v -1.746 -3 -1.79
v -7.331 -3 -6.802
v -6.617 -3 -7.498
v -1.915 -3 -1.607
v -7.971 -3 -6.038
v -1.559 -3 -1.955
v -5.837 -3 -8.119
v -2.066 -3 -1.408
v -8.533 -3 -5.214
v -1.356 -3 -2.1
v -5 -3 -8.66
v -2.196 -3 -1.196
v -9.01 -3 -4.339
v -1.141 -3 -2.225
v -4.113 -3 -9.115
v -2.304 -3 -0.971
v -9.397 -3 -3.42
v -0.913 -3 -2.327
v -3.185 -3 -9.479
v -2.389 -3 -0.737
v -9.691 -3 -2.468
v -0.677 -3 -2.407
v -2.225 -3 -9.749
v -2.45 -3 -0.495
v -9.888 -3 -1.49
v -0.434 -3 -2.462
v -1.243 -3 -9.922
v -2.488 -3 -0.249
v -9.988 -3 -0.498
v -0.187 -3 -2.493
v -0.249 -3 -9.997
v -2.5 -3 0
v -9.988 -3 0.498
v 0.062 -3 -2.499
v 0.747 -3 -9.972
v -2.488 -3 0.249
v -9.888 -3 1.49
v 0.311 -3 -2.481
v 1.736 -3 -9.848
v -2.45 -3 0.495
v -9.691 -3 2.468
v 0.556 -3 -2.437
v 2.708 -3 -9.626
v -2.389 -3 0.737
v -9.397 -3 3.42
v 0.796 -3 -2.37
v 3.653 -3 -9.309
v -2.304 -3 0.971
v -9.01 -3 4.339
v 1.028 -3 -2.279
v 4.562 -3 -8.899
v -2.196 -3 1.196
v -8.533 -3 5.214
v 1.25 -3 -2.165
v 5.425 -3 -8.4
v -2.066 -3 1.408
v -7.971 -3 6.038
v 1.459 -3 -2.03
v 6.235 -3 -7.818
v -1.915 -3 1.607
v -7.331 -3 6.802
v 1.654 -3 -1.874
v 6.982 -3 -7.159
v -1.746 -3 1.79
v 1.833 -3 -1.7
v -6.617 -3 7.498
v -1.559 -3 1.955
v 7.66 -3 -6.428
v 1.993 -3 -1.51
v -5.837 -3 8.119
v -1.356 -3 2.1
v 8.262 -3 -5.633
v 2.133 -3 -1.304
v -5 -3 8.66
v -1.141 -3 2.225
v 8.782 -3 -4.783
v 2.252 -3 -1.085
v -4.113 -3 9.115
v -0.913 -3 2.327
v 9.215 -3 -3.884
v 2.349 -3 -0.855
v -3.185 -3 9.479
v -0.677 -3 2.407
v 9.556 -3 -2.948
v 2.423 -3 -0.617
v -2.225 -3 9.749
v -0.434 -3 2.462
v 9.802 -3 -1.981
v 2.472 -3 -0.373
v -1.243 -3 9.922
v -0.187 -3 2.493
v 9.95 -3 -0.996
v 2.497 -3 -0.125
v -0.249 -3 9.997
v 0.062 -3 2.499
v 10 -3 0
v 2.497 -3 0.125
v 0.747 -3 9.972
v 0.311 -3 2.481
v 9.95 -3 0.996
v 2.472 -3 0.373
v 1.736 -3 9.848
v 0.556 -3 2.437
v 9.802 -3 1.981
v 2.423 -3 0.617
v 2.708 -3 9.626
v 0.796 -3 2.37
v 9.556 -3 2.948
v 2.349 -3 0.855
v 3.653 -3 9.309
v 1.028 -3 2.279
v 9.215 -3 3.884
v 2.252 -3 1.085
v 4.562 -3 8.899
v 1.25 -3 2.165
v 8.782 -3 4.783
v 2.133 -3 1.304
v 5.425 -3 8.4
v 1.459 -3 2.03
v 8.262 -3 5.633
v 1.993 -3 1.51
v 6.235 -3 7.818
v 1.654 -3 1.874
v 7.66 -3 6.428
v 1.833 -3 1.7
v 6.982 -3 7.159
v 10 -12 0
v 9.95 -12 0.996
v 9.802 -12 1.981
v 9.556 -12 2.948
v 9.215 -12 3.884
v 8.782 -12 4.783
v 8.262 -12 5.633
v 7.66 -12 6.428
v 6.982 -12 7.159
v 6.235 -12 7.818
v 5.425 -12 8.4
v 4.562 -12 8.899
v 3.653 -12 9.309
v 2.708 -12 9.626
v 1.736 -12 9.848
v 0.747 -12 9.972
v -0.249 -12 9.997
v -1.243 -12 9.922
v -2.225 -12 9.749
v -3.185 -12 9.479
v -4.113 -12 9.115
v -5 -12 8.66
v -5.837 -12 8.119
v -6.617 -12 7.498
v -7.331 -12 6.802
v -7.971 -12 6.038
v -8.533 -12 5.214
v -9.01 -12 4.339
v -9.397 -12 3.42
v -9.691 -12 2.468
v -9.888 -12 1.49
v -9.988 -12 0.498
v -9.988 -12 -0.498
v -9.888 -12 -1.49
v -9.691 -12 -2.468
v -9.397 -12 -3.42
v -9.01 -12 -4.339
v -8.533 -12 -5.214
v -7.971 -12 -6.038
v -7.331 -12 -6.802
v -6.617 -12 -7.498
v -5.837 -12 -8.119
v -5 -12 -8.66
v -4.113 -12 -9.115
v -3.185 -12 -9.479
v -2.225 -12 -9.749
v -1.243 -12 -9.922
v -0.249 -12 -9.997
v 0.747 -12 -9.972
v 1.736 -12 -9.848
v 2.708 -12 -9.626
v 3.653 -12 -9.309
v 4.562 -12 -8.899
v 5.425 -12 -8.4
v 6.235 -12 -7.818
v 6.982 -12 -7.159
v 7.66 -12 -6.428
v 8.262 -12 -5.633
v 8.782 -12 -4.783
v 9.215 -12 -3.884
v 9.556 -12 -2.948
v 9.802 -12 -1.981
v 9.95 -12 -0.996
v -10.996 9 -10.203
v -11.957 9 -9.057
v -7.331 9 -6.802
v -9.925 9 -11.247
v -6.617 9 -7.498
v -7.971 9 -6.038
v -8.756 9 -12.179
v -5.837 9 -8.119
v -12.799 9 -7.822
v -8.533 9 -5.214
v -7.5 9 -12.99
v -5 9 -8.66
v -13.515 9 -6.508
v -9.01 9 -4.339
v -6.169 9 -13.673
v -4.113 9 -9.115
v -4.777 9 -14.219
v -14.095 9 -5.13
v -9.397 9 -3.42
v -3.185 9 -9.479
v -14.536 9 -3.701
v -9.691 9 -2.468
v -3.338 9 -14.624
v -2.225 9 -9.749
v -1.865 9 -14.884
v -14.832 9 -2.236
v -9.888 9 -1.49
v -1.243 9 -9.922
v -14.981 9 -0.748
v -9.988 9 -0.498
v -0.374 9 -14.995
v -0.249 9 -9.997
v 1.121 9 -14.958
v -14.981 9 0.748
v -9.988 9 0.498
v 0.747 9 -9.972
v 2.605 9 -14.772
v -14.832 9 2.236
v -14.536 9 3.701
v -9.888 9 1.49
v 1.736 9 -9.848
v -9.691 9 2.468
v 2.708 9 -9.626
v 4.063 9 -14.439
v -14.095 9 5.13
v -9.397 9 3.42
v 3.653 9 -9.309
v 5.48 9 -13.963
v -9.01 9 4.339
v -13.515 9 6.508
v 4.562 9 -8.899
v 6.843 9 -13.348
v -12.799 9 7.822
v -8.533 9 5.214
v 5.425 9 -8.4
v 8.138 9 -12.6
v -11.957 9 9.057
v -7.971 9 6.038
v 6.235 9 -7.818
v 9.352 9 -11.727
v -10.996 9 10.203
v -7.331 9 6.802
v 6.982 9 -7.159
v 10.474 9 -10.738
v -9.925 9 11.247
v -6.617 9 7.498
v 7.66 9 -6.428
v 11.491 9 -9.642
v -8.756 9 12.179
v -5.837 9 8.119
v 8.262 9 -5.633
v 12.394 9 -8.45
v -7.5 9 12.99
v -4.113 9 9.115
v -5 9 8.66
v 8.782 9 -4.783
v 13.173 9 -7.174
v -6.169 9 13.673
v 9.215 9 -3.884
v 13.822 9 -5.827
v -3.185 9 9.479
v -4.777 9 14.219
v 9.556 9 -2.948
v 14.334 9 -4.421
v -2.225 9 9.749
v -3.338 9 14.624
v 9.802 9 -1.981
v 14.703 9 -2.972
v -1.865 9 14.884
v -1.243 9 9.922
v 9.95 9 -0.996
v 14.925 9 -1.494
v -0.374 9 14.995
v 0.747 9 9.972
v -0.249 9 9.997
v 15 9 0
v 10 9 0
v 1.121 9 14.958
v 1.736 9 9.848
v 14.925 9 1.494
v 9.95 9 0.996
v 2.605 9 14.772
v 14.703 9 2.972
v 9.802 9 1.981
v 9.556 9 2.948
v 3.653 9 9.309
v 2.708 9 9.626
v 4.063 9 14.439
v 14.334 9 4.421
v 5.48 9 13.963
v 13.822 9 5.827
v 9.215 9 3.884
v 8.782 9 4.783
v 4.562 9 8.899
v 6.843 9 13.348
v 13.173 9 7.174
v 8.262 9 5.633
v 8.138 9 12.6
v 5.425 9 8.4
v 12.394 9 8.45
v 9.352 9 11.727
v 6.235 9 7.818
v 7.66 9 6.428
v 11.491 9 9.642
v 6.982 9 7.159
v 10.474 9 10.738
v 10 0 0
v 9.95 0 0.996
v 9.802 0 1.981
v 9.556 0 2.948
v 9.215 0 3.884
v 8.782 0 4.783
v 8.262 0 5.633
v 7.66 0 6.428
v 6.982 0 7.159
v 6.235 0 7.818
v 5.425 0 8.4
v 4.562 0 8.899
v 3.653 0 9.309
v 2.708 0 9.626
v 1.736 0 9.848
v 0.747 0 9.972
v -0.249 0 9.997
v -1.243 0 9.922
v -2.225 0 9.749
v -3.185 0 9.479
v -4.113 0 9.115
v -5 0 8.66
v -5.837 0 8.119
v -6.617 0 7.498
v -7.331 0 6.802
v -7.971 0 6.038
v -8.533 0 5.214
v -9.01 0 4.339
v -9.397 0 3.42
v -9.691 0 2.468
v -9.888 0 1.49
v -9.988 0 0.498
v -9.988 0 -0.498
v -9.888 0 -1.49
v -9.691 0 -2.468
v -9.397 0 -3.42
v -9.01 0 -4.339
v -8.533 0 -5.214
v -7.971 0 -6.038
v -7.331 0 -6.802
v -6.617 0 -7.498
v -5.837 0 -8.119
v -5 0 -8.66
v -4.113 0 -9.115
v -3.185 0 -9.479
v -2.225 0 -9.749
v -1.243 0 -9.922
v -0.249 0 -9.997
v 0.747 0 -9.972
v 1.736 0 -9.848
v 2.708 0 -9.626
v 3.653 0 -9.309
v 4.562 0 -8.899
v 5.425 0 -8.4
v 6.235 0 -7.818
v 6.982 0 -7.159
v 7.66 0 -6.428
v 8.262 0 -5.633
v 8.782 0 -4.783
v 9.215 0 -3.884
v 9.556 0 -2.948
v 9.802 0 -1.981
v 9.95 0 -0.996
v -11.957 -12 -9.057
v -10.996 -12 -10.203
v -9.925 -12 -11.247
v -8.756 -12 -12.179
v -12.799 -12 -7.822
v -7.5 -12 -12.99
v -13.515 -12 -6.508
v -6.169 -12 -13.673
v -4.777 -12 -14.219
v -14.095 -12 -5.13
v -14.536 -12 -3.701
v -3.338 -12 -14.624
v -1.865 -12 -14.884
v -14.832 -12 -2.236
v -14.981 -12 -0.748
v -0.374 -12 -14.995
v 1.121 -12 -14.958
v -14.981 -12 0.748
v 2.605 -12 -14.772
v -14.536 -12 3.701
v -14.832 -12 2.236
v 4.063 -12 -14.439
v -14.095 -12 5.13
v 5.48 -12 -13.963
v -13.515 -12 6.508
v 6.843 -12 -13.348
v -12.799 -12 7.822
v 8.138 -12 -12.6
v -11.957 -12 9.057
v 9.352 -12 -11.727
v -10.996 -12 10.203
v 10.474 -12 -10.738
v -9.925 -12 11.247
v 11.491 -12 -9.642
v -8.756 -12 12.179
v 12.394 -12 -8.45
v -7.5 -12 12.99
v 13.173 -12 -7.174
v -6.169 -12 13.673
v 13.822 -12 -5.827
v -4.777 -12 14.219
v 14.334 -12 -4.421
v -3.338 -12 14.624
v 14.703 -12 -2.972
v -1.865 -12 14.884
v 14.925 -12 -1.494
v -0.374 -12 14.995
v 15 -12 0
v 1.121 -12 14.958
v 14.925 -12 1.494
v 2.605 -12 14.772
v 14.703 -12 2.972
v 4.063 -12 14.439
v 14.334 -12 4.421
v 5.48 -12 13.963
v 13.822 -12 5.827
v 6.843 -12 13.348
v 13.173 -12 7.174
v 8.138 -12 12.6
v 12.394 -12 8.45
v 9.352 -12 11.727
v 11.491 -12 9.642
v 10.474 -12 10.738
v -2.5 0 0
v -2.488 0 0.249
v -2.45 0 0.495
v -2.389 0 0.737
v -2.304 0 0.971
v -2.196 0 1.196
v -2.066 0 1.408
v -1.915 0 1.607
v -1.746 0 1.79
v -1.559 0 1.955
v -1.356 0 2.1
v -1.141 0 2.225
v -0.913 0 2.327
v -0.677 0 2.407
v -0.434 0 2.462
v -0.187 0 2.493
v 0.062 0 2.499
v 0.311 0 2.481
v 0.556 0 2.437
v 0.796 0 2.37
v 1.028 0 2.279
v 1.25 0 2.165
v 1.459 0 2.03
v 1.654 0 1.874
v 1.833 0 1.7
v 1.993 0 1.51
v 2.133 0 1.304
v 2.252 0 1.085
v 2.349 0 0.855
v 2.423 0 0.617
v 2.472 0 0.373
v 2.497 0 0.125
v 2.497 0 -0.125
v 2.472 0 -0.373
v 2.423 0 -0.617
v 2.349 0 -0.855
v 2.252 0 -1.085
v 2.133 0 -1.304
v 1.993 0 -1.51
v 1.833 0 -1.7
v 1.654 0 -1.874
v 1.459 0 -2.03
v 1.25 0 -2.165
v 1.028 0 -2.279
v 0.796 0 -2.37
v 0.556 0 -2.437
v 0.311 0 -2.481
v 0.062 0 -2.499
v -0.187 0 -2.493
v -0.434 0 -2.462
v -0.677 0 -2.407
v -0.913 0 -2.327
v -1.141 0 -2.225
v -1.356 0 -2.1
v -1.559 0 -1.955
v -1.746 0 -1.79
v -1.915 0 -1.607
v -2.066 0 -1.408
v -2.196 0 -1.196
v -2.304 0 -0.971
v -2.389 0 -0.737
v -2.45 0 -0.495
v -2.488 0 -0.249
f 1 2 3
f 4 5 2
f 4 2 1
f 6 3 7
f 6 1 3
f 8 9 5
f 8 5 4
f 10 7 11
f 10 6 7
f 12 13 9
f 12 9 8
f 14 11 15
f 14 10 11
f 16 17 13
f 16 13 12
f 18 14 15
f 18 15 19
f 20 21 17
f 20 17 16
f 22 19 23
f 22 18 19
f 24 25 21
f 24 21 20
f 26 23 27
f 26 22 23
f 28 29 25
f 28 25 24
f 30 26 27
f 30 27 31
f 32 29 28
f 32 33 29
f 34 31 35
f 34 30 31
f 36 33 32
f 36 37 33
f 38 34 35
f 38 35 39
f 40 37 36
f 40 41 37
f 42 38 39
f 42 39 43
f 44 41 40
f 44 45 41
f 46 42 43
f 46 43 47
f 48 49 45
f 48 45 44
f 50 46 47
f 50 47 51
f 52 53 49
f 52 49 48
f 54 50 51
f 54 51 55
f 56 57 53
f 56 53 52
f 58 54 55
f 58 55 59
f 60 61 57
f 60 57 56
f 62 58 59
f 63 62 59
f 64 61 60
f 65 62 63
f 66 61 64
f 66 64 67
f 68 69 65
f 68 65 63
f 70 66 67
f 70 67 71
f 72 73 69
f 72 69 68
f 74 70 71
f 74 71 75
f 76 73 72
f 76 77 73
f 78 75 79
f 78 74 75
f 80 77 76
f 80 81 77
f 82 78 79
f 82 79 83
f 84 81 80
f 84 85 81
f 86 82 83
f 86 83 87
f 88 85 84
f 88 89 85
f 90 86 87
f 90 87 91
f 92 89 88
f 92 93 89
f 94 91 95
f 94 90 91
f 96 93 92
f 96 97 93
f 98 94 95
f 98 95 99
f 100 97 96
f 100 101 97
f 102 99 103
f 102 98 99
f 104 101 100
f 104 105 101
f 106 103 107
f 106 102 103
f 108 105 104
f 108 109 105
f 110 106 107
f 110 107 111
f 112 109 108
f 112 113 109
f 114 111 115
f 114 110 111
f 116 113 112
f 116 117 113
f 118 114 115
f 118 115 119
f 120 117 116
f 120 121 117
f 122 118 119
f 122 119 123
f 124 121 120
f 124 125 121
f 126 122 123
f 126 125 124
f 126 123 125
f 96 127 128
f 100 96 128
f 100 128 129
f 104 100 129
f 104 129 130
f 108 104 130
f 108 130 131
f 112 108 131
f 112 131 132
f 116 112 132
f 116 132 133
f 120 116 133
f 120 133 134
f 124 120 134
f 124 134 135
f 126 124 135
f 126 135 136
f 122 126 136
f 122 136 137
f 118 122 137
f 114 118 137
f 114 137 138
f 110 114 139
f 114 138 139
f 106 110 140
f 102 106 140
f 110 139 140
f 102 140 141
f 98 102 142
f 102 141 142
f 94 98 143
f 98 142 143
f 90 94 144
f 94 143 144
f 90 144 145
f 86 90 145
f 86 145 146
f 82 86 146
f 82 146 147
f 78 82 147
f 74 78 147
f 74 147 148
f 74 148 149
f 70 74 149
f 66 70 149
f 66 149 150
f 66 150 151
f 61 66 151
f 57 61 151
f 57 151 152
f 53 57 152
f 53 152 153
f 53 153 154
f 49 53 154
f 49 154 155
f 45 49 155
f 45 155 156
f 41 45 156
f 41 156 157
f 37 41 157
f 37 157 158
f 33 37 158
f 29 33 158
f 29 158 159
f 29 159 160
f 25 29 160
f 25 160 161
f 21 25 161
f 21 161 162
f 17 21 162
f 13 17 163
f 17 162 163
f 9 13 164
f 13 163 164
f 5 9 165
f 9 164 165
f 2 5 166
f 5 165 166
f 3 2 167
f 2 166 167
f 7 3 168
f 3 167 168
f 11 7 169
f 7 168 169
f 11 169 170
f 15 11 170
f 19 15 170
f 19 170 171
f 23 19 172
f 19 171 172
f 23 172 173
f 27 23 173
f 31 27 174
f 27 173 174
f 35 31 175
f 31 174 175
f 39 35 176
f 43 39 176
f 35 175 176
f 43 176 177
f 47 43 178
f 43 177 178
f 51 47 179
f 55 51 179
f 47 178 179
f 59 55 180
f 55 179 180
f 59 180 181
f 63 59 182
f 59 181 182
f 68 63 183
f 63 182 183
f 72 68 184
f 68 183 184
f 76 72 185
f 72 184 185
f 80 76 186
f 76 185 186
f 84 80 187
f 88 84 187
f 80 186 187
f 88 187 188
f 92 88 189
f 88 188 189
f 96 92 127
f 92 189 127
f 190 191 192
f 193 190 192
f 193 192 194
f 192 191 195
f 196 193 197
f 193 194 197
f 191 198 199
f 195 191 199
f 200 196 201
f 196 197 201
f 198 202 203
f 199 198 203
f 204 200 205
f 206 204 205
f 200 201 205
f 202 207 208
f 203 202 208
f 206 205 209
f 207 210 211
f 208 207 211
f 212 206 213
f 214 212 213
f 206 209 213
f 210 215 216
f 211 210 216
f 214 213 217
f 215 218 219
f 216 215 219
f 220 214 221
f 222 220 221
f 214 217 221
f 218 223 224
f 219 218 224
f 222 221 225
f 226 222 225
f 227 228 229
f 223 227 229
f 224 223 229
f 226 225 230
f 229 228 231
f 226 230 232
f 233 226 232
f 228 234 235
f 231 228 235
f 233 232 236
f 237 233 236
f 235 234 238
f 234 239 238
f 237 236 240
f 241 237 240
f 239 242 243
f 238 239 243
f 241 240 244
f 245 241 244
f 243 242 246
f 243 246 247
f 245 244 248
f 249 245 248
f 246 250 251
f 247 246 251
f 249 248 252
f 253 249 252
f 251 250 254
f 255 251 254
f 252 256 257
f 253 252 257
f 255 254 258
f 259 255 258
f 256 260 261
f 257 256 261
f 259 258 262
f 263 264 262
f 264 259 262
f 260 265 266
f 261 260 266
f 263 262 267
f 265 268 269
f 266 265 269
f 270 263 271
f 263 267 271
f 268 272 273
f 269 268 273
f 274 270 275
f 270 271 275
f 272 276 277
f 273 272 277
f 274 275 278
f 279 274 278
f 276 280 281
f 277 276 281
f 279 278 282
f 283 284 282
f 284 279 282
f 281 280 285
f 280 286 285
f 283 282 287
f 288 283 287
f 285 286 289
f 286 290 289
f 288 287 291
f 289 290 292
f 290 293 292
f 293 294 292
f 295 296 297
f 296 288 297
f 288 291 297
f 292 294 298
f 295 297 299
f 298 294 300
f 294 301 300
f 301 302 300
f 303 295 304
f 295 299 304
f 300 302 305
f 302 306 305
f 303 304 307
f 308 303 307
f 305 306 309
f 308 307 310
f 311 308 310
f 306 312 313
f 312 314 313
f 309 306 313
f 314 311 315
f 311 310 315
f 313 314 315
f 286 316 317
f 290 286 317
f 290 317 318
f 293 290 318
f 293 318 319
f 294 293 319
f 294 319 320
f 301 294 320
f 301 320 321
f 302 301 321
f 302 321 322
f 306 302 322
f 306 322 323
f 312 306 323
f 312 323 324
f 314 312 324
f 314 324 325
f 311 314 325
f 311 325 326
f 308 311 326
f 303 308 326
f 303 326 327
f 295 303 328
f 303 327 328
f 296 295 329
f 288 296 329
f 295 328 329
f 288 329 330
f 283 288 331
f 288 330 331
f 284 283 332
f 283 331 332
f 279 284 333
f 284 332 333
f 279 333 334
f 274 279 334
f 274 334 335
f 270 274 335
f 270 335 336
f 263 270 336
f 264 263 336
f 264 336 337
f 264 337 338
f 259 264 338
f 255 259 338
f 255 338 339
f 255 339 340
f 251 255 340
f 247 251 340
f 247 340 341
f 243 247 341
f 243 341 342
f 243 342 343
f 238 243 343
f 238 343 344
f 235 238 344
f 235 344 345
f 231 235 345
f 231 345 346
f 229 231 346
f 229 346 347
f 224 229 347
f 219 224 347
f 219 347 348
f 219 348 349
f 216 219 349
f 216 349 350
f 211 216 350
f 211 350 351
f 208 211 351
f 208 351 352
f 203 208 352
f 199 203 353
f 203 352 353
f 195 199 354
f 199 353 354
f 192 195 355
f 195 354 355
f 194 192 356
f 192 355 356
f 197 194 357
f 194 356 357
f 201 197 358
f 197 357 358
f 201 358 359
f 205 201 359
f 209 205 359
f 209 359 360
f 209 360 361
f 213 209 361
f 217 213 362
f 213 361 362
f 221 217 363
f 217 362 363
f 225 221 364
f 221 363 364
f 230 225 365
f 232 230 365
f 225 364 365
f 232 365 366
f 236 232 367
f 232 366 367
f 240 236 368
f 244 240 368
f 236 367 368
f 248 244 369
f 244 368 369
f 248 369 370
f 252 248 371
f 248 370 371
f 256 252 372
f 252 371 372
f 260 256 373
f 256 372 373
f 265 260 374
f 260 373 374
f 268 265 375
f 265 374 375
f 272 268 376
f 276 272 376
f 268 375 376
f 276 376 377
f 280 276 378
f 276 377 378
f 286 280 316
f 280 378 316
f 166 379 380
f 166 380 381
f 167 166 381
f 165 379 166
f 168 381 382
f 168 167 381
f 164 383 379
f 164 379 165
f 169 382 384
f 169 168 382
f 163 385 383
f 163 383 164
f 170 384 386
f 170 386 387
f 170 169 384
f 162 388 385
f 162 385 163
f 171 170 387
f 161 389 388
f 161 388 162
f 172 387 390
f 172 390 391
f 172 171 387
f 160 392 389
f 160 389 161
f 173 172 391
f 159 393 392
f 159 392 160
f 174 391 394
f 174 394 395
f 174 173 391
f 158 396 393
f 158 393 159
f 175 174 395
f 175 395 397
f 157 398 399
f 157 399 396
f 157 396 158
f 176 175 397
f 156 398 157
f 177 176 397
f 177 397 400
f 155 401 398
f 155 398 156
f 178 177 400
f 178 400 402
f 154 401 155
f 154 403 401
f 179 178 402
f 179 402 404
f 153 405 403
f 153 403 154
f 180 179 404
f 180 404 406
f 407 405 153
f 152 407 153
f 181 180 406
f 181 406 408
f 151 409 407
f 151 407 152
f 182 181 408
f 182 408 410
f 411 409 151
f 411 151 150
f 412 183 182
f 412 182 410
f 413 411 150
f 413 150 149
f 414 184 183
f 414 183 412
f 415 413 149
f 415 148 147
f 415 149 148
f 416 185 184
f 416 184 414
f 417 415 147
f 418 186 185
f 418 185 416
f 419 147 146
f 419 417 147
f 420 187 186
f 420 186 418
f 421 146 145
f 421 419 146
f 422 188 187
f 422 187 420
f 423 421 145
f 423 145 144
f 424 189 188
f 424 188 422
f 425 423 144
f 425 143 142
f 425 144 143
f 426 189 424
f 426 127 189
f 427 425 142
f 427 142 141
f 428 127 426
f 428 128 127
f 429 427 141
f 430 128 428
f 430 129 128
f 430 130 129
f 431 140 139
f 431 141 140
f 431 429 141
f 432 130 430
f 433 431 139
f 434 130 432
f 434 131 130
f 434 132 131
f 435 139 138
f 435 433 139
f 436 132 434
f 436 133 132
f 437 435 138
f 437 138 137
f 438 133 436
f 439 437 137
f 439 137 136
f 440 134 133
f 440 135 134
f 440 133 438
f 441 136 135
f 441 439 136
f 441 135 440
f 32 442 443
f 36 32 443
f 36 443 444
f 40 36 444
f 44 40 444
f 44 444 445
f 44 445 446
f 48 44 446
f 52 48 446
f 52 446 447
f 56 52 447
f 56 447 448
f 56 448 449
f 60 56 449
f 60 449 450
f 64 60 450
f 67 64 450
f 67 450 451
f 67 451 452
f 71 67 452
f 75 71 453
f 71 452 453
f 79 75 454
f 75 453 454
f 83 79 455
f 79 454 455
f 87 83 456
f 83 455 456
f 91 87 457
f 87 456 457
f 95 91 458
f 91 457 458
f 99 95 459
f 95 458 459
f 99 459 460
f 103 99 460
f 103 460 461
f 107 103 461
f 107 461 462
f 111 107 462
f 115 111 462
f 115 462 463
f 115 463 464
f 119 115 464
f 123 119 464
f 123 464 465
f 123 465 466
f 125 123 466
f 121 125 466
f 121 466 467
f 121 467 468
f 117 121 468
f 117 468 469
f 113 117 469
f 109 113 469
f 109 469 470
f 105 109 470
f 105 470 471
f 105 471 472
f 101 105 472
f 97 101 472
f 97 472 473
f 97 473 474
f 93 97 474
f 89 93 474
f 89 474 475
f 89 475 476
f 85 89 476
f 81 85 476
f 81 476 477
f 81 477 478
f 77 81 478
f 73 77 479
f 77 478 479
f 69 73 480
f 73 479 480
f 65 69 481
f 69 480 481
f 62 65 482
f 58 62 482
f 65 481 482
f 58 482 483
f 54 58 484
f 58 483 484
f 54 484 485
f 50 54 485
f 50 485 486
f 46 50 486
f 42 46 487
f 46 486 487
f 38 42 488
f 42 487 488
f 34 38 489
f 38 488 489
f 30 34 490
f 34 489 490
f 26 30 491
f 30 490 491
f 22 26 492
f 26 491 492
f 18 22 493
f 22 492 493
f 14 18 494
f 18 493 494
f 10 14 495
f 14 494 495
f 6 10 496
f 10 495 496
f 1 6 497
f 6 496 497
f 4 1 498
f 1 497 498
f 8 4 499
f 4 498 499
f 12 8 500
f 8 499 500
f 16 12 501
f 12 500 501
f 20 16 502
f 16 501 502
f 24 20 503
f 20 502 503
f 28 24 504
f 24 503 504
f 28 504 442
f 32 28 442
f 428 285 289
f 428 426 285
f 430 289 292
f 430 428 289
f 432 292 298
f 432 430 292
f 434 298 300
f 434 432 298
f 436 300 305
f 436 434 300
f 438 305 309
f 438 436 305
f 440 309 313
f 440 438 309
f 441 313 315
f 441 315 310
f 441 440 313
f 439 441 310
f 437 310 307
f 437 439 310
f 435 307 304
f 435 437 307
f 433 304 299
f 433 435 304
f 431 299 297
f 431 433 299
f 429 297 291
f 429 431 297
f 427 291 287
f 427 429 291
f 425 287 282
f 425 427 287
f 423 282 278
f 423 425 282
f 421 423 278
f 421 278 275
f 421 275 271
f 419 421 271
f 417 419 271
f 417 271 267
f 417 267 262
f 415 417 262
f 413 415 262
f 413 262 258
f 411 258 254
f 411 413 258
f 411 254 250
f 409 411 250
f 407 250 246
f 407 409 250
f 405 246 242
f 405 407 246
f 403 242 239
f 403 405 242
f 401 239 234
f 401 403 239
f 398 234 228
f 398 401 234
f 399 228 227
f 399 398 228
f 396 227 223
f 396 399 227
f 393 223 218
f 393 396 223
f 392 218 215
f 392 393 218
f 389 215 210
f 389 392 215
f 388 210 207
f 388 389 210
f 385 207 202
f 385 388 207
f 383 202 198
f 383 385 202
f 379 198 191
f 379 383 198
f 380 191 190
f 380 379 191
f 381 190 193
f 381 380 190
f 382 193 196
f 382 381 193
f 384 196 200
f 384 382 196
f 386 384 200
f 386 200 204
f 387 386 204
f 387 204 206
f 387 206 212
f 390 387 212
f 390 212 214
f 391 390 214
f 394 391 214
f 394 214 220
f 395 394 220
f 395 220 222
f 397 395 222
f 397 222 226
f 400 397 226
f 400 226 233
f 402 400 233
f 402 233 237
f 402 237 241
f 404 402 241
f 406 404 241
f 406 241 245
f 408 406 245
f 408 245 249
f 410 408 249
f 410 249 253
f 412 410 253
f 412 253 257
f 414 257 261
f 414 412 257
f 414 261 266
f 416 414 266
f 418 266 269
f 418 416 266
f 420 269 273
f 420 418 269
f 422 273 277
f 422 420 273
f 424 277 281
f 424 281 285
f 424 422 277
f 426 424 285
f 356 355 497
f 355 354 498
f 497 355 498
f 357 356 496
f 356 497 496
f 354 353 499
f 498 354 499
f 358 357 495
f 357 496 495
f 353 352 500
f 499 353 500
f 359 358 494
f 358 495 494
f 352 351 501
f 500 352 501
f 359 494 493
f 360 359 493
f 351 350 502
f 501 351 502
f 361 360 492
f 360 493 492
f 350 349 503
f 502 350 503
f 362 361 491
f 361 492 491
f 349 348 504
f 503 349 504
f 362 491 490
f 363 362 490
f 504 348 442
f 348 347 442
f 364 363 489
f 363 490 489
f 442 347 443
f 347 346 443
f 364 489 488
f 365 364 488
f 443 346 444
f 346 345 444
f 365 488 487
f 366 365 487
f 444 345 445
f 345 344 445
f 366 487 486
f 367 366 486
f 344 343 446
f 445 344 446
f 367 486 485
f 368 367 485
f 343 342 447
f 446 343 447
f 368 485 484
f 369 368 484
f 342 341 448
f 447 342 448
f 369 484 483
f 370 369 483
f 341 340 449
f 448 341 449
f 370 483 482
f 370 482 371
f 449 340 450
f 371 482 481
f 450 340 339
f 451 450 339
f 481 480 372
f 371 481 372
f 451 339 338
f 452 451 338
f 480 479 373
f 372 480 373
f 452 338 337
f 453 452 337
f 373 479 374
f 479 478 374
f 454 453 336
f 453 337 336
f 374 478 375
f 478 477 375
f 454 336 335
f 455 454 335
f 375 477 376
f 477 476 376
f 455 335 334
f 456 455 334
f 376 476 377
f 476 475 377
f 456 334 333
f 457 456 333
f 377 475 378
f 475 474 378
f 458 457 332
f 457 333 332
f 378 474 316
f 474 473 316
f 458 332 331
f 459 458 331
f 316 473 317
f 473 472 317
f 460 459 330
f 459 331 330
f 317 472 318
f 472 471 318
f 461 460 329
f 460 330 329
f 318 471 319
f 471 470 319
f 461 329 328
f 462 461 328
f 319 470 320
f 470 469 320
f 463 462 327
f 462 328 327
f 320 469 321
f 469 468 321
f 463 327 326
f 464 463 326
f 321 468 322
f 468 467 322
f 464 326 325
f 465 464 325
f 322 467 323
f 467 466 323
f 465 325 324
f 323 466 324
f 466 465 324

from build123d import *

# Parameters (mm, degrees)
F0_R          = 15
F1_DEPTH      = 12
F1_DEPTH_BACK = 9
F3_D          = 20
F4_R          = 13.574911
F5_DEPTH      = 3
F7_D          = 5


with BuildPart() as f1:
    # F0 (on Front) → F1 (new body, two sides)
    with BuildSketch(Plane.XZ) as f1_sk:
        Circle(F0_R)
    extrude(amount=F1_DEPTH)
    extrude(f1_sk.sketch, amount=-F1_DEPTH_BACK)

    # F3 (through all)
    with Locations(Plane(origin=(0, 9, 0), x_dir=(-1, 0, 0), z_dir=(0, 1, 0))):
        with Locations((0, 0)):
            Hole(F3_D / 2)

    # F4 (on Front) → F5 (join)
    with BuildSketch(Plane.XZ):
        Circle(F4_R)
    extrude(amount=F5_DEPTH)

    # F7 (through all)
    with Locations(Plane.XZ.offset(3)):
        with Locations((0, 0)):
            Hole(F7_D / 2)


solid = f1.part
